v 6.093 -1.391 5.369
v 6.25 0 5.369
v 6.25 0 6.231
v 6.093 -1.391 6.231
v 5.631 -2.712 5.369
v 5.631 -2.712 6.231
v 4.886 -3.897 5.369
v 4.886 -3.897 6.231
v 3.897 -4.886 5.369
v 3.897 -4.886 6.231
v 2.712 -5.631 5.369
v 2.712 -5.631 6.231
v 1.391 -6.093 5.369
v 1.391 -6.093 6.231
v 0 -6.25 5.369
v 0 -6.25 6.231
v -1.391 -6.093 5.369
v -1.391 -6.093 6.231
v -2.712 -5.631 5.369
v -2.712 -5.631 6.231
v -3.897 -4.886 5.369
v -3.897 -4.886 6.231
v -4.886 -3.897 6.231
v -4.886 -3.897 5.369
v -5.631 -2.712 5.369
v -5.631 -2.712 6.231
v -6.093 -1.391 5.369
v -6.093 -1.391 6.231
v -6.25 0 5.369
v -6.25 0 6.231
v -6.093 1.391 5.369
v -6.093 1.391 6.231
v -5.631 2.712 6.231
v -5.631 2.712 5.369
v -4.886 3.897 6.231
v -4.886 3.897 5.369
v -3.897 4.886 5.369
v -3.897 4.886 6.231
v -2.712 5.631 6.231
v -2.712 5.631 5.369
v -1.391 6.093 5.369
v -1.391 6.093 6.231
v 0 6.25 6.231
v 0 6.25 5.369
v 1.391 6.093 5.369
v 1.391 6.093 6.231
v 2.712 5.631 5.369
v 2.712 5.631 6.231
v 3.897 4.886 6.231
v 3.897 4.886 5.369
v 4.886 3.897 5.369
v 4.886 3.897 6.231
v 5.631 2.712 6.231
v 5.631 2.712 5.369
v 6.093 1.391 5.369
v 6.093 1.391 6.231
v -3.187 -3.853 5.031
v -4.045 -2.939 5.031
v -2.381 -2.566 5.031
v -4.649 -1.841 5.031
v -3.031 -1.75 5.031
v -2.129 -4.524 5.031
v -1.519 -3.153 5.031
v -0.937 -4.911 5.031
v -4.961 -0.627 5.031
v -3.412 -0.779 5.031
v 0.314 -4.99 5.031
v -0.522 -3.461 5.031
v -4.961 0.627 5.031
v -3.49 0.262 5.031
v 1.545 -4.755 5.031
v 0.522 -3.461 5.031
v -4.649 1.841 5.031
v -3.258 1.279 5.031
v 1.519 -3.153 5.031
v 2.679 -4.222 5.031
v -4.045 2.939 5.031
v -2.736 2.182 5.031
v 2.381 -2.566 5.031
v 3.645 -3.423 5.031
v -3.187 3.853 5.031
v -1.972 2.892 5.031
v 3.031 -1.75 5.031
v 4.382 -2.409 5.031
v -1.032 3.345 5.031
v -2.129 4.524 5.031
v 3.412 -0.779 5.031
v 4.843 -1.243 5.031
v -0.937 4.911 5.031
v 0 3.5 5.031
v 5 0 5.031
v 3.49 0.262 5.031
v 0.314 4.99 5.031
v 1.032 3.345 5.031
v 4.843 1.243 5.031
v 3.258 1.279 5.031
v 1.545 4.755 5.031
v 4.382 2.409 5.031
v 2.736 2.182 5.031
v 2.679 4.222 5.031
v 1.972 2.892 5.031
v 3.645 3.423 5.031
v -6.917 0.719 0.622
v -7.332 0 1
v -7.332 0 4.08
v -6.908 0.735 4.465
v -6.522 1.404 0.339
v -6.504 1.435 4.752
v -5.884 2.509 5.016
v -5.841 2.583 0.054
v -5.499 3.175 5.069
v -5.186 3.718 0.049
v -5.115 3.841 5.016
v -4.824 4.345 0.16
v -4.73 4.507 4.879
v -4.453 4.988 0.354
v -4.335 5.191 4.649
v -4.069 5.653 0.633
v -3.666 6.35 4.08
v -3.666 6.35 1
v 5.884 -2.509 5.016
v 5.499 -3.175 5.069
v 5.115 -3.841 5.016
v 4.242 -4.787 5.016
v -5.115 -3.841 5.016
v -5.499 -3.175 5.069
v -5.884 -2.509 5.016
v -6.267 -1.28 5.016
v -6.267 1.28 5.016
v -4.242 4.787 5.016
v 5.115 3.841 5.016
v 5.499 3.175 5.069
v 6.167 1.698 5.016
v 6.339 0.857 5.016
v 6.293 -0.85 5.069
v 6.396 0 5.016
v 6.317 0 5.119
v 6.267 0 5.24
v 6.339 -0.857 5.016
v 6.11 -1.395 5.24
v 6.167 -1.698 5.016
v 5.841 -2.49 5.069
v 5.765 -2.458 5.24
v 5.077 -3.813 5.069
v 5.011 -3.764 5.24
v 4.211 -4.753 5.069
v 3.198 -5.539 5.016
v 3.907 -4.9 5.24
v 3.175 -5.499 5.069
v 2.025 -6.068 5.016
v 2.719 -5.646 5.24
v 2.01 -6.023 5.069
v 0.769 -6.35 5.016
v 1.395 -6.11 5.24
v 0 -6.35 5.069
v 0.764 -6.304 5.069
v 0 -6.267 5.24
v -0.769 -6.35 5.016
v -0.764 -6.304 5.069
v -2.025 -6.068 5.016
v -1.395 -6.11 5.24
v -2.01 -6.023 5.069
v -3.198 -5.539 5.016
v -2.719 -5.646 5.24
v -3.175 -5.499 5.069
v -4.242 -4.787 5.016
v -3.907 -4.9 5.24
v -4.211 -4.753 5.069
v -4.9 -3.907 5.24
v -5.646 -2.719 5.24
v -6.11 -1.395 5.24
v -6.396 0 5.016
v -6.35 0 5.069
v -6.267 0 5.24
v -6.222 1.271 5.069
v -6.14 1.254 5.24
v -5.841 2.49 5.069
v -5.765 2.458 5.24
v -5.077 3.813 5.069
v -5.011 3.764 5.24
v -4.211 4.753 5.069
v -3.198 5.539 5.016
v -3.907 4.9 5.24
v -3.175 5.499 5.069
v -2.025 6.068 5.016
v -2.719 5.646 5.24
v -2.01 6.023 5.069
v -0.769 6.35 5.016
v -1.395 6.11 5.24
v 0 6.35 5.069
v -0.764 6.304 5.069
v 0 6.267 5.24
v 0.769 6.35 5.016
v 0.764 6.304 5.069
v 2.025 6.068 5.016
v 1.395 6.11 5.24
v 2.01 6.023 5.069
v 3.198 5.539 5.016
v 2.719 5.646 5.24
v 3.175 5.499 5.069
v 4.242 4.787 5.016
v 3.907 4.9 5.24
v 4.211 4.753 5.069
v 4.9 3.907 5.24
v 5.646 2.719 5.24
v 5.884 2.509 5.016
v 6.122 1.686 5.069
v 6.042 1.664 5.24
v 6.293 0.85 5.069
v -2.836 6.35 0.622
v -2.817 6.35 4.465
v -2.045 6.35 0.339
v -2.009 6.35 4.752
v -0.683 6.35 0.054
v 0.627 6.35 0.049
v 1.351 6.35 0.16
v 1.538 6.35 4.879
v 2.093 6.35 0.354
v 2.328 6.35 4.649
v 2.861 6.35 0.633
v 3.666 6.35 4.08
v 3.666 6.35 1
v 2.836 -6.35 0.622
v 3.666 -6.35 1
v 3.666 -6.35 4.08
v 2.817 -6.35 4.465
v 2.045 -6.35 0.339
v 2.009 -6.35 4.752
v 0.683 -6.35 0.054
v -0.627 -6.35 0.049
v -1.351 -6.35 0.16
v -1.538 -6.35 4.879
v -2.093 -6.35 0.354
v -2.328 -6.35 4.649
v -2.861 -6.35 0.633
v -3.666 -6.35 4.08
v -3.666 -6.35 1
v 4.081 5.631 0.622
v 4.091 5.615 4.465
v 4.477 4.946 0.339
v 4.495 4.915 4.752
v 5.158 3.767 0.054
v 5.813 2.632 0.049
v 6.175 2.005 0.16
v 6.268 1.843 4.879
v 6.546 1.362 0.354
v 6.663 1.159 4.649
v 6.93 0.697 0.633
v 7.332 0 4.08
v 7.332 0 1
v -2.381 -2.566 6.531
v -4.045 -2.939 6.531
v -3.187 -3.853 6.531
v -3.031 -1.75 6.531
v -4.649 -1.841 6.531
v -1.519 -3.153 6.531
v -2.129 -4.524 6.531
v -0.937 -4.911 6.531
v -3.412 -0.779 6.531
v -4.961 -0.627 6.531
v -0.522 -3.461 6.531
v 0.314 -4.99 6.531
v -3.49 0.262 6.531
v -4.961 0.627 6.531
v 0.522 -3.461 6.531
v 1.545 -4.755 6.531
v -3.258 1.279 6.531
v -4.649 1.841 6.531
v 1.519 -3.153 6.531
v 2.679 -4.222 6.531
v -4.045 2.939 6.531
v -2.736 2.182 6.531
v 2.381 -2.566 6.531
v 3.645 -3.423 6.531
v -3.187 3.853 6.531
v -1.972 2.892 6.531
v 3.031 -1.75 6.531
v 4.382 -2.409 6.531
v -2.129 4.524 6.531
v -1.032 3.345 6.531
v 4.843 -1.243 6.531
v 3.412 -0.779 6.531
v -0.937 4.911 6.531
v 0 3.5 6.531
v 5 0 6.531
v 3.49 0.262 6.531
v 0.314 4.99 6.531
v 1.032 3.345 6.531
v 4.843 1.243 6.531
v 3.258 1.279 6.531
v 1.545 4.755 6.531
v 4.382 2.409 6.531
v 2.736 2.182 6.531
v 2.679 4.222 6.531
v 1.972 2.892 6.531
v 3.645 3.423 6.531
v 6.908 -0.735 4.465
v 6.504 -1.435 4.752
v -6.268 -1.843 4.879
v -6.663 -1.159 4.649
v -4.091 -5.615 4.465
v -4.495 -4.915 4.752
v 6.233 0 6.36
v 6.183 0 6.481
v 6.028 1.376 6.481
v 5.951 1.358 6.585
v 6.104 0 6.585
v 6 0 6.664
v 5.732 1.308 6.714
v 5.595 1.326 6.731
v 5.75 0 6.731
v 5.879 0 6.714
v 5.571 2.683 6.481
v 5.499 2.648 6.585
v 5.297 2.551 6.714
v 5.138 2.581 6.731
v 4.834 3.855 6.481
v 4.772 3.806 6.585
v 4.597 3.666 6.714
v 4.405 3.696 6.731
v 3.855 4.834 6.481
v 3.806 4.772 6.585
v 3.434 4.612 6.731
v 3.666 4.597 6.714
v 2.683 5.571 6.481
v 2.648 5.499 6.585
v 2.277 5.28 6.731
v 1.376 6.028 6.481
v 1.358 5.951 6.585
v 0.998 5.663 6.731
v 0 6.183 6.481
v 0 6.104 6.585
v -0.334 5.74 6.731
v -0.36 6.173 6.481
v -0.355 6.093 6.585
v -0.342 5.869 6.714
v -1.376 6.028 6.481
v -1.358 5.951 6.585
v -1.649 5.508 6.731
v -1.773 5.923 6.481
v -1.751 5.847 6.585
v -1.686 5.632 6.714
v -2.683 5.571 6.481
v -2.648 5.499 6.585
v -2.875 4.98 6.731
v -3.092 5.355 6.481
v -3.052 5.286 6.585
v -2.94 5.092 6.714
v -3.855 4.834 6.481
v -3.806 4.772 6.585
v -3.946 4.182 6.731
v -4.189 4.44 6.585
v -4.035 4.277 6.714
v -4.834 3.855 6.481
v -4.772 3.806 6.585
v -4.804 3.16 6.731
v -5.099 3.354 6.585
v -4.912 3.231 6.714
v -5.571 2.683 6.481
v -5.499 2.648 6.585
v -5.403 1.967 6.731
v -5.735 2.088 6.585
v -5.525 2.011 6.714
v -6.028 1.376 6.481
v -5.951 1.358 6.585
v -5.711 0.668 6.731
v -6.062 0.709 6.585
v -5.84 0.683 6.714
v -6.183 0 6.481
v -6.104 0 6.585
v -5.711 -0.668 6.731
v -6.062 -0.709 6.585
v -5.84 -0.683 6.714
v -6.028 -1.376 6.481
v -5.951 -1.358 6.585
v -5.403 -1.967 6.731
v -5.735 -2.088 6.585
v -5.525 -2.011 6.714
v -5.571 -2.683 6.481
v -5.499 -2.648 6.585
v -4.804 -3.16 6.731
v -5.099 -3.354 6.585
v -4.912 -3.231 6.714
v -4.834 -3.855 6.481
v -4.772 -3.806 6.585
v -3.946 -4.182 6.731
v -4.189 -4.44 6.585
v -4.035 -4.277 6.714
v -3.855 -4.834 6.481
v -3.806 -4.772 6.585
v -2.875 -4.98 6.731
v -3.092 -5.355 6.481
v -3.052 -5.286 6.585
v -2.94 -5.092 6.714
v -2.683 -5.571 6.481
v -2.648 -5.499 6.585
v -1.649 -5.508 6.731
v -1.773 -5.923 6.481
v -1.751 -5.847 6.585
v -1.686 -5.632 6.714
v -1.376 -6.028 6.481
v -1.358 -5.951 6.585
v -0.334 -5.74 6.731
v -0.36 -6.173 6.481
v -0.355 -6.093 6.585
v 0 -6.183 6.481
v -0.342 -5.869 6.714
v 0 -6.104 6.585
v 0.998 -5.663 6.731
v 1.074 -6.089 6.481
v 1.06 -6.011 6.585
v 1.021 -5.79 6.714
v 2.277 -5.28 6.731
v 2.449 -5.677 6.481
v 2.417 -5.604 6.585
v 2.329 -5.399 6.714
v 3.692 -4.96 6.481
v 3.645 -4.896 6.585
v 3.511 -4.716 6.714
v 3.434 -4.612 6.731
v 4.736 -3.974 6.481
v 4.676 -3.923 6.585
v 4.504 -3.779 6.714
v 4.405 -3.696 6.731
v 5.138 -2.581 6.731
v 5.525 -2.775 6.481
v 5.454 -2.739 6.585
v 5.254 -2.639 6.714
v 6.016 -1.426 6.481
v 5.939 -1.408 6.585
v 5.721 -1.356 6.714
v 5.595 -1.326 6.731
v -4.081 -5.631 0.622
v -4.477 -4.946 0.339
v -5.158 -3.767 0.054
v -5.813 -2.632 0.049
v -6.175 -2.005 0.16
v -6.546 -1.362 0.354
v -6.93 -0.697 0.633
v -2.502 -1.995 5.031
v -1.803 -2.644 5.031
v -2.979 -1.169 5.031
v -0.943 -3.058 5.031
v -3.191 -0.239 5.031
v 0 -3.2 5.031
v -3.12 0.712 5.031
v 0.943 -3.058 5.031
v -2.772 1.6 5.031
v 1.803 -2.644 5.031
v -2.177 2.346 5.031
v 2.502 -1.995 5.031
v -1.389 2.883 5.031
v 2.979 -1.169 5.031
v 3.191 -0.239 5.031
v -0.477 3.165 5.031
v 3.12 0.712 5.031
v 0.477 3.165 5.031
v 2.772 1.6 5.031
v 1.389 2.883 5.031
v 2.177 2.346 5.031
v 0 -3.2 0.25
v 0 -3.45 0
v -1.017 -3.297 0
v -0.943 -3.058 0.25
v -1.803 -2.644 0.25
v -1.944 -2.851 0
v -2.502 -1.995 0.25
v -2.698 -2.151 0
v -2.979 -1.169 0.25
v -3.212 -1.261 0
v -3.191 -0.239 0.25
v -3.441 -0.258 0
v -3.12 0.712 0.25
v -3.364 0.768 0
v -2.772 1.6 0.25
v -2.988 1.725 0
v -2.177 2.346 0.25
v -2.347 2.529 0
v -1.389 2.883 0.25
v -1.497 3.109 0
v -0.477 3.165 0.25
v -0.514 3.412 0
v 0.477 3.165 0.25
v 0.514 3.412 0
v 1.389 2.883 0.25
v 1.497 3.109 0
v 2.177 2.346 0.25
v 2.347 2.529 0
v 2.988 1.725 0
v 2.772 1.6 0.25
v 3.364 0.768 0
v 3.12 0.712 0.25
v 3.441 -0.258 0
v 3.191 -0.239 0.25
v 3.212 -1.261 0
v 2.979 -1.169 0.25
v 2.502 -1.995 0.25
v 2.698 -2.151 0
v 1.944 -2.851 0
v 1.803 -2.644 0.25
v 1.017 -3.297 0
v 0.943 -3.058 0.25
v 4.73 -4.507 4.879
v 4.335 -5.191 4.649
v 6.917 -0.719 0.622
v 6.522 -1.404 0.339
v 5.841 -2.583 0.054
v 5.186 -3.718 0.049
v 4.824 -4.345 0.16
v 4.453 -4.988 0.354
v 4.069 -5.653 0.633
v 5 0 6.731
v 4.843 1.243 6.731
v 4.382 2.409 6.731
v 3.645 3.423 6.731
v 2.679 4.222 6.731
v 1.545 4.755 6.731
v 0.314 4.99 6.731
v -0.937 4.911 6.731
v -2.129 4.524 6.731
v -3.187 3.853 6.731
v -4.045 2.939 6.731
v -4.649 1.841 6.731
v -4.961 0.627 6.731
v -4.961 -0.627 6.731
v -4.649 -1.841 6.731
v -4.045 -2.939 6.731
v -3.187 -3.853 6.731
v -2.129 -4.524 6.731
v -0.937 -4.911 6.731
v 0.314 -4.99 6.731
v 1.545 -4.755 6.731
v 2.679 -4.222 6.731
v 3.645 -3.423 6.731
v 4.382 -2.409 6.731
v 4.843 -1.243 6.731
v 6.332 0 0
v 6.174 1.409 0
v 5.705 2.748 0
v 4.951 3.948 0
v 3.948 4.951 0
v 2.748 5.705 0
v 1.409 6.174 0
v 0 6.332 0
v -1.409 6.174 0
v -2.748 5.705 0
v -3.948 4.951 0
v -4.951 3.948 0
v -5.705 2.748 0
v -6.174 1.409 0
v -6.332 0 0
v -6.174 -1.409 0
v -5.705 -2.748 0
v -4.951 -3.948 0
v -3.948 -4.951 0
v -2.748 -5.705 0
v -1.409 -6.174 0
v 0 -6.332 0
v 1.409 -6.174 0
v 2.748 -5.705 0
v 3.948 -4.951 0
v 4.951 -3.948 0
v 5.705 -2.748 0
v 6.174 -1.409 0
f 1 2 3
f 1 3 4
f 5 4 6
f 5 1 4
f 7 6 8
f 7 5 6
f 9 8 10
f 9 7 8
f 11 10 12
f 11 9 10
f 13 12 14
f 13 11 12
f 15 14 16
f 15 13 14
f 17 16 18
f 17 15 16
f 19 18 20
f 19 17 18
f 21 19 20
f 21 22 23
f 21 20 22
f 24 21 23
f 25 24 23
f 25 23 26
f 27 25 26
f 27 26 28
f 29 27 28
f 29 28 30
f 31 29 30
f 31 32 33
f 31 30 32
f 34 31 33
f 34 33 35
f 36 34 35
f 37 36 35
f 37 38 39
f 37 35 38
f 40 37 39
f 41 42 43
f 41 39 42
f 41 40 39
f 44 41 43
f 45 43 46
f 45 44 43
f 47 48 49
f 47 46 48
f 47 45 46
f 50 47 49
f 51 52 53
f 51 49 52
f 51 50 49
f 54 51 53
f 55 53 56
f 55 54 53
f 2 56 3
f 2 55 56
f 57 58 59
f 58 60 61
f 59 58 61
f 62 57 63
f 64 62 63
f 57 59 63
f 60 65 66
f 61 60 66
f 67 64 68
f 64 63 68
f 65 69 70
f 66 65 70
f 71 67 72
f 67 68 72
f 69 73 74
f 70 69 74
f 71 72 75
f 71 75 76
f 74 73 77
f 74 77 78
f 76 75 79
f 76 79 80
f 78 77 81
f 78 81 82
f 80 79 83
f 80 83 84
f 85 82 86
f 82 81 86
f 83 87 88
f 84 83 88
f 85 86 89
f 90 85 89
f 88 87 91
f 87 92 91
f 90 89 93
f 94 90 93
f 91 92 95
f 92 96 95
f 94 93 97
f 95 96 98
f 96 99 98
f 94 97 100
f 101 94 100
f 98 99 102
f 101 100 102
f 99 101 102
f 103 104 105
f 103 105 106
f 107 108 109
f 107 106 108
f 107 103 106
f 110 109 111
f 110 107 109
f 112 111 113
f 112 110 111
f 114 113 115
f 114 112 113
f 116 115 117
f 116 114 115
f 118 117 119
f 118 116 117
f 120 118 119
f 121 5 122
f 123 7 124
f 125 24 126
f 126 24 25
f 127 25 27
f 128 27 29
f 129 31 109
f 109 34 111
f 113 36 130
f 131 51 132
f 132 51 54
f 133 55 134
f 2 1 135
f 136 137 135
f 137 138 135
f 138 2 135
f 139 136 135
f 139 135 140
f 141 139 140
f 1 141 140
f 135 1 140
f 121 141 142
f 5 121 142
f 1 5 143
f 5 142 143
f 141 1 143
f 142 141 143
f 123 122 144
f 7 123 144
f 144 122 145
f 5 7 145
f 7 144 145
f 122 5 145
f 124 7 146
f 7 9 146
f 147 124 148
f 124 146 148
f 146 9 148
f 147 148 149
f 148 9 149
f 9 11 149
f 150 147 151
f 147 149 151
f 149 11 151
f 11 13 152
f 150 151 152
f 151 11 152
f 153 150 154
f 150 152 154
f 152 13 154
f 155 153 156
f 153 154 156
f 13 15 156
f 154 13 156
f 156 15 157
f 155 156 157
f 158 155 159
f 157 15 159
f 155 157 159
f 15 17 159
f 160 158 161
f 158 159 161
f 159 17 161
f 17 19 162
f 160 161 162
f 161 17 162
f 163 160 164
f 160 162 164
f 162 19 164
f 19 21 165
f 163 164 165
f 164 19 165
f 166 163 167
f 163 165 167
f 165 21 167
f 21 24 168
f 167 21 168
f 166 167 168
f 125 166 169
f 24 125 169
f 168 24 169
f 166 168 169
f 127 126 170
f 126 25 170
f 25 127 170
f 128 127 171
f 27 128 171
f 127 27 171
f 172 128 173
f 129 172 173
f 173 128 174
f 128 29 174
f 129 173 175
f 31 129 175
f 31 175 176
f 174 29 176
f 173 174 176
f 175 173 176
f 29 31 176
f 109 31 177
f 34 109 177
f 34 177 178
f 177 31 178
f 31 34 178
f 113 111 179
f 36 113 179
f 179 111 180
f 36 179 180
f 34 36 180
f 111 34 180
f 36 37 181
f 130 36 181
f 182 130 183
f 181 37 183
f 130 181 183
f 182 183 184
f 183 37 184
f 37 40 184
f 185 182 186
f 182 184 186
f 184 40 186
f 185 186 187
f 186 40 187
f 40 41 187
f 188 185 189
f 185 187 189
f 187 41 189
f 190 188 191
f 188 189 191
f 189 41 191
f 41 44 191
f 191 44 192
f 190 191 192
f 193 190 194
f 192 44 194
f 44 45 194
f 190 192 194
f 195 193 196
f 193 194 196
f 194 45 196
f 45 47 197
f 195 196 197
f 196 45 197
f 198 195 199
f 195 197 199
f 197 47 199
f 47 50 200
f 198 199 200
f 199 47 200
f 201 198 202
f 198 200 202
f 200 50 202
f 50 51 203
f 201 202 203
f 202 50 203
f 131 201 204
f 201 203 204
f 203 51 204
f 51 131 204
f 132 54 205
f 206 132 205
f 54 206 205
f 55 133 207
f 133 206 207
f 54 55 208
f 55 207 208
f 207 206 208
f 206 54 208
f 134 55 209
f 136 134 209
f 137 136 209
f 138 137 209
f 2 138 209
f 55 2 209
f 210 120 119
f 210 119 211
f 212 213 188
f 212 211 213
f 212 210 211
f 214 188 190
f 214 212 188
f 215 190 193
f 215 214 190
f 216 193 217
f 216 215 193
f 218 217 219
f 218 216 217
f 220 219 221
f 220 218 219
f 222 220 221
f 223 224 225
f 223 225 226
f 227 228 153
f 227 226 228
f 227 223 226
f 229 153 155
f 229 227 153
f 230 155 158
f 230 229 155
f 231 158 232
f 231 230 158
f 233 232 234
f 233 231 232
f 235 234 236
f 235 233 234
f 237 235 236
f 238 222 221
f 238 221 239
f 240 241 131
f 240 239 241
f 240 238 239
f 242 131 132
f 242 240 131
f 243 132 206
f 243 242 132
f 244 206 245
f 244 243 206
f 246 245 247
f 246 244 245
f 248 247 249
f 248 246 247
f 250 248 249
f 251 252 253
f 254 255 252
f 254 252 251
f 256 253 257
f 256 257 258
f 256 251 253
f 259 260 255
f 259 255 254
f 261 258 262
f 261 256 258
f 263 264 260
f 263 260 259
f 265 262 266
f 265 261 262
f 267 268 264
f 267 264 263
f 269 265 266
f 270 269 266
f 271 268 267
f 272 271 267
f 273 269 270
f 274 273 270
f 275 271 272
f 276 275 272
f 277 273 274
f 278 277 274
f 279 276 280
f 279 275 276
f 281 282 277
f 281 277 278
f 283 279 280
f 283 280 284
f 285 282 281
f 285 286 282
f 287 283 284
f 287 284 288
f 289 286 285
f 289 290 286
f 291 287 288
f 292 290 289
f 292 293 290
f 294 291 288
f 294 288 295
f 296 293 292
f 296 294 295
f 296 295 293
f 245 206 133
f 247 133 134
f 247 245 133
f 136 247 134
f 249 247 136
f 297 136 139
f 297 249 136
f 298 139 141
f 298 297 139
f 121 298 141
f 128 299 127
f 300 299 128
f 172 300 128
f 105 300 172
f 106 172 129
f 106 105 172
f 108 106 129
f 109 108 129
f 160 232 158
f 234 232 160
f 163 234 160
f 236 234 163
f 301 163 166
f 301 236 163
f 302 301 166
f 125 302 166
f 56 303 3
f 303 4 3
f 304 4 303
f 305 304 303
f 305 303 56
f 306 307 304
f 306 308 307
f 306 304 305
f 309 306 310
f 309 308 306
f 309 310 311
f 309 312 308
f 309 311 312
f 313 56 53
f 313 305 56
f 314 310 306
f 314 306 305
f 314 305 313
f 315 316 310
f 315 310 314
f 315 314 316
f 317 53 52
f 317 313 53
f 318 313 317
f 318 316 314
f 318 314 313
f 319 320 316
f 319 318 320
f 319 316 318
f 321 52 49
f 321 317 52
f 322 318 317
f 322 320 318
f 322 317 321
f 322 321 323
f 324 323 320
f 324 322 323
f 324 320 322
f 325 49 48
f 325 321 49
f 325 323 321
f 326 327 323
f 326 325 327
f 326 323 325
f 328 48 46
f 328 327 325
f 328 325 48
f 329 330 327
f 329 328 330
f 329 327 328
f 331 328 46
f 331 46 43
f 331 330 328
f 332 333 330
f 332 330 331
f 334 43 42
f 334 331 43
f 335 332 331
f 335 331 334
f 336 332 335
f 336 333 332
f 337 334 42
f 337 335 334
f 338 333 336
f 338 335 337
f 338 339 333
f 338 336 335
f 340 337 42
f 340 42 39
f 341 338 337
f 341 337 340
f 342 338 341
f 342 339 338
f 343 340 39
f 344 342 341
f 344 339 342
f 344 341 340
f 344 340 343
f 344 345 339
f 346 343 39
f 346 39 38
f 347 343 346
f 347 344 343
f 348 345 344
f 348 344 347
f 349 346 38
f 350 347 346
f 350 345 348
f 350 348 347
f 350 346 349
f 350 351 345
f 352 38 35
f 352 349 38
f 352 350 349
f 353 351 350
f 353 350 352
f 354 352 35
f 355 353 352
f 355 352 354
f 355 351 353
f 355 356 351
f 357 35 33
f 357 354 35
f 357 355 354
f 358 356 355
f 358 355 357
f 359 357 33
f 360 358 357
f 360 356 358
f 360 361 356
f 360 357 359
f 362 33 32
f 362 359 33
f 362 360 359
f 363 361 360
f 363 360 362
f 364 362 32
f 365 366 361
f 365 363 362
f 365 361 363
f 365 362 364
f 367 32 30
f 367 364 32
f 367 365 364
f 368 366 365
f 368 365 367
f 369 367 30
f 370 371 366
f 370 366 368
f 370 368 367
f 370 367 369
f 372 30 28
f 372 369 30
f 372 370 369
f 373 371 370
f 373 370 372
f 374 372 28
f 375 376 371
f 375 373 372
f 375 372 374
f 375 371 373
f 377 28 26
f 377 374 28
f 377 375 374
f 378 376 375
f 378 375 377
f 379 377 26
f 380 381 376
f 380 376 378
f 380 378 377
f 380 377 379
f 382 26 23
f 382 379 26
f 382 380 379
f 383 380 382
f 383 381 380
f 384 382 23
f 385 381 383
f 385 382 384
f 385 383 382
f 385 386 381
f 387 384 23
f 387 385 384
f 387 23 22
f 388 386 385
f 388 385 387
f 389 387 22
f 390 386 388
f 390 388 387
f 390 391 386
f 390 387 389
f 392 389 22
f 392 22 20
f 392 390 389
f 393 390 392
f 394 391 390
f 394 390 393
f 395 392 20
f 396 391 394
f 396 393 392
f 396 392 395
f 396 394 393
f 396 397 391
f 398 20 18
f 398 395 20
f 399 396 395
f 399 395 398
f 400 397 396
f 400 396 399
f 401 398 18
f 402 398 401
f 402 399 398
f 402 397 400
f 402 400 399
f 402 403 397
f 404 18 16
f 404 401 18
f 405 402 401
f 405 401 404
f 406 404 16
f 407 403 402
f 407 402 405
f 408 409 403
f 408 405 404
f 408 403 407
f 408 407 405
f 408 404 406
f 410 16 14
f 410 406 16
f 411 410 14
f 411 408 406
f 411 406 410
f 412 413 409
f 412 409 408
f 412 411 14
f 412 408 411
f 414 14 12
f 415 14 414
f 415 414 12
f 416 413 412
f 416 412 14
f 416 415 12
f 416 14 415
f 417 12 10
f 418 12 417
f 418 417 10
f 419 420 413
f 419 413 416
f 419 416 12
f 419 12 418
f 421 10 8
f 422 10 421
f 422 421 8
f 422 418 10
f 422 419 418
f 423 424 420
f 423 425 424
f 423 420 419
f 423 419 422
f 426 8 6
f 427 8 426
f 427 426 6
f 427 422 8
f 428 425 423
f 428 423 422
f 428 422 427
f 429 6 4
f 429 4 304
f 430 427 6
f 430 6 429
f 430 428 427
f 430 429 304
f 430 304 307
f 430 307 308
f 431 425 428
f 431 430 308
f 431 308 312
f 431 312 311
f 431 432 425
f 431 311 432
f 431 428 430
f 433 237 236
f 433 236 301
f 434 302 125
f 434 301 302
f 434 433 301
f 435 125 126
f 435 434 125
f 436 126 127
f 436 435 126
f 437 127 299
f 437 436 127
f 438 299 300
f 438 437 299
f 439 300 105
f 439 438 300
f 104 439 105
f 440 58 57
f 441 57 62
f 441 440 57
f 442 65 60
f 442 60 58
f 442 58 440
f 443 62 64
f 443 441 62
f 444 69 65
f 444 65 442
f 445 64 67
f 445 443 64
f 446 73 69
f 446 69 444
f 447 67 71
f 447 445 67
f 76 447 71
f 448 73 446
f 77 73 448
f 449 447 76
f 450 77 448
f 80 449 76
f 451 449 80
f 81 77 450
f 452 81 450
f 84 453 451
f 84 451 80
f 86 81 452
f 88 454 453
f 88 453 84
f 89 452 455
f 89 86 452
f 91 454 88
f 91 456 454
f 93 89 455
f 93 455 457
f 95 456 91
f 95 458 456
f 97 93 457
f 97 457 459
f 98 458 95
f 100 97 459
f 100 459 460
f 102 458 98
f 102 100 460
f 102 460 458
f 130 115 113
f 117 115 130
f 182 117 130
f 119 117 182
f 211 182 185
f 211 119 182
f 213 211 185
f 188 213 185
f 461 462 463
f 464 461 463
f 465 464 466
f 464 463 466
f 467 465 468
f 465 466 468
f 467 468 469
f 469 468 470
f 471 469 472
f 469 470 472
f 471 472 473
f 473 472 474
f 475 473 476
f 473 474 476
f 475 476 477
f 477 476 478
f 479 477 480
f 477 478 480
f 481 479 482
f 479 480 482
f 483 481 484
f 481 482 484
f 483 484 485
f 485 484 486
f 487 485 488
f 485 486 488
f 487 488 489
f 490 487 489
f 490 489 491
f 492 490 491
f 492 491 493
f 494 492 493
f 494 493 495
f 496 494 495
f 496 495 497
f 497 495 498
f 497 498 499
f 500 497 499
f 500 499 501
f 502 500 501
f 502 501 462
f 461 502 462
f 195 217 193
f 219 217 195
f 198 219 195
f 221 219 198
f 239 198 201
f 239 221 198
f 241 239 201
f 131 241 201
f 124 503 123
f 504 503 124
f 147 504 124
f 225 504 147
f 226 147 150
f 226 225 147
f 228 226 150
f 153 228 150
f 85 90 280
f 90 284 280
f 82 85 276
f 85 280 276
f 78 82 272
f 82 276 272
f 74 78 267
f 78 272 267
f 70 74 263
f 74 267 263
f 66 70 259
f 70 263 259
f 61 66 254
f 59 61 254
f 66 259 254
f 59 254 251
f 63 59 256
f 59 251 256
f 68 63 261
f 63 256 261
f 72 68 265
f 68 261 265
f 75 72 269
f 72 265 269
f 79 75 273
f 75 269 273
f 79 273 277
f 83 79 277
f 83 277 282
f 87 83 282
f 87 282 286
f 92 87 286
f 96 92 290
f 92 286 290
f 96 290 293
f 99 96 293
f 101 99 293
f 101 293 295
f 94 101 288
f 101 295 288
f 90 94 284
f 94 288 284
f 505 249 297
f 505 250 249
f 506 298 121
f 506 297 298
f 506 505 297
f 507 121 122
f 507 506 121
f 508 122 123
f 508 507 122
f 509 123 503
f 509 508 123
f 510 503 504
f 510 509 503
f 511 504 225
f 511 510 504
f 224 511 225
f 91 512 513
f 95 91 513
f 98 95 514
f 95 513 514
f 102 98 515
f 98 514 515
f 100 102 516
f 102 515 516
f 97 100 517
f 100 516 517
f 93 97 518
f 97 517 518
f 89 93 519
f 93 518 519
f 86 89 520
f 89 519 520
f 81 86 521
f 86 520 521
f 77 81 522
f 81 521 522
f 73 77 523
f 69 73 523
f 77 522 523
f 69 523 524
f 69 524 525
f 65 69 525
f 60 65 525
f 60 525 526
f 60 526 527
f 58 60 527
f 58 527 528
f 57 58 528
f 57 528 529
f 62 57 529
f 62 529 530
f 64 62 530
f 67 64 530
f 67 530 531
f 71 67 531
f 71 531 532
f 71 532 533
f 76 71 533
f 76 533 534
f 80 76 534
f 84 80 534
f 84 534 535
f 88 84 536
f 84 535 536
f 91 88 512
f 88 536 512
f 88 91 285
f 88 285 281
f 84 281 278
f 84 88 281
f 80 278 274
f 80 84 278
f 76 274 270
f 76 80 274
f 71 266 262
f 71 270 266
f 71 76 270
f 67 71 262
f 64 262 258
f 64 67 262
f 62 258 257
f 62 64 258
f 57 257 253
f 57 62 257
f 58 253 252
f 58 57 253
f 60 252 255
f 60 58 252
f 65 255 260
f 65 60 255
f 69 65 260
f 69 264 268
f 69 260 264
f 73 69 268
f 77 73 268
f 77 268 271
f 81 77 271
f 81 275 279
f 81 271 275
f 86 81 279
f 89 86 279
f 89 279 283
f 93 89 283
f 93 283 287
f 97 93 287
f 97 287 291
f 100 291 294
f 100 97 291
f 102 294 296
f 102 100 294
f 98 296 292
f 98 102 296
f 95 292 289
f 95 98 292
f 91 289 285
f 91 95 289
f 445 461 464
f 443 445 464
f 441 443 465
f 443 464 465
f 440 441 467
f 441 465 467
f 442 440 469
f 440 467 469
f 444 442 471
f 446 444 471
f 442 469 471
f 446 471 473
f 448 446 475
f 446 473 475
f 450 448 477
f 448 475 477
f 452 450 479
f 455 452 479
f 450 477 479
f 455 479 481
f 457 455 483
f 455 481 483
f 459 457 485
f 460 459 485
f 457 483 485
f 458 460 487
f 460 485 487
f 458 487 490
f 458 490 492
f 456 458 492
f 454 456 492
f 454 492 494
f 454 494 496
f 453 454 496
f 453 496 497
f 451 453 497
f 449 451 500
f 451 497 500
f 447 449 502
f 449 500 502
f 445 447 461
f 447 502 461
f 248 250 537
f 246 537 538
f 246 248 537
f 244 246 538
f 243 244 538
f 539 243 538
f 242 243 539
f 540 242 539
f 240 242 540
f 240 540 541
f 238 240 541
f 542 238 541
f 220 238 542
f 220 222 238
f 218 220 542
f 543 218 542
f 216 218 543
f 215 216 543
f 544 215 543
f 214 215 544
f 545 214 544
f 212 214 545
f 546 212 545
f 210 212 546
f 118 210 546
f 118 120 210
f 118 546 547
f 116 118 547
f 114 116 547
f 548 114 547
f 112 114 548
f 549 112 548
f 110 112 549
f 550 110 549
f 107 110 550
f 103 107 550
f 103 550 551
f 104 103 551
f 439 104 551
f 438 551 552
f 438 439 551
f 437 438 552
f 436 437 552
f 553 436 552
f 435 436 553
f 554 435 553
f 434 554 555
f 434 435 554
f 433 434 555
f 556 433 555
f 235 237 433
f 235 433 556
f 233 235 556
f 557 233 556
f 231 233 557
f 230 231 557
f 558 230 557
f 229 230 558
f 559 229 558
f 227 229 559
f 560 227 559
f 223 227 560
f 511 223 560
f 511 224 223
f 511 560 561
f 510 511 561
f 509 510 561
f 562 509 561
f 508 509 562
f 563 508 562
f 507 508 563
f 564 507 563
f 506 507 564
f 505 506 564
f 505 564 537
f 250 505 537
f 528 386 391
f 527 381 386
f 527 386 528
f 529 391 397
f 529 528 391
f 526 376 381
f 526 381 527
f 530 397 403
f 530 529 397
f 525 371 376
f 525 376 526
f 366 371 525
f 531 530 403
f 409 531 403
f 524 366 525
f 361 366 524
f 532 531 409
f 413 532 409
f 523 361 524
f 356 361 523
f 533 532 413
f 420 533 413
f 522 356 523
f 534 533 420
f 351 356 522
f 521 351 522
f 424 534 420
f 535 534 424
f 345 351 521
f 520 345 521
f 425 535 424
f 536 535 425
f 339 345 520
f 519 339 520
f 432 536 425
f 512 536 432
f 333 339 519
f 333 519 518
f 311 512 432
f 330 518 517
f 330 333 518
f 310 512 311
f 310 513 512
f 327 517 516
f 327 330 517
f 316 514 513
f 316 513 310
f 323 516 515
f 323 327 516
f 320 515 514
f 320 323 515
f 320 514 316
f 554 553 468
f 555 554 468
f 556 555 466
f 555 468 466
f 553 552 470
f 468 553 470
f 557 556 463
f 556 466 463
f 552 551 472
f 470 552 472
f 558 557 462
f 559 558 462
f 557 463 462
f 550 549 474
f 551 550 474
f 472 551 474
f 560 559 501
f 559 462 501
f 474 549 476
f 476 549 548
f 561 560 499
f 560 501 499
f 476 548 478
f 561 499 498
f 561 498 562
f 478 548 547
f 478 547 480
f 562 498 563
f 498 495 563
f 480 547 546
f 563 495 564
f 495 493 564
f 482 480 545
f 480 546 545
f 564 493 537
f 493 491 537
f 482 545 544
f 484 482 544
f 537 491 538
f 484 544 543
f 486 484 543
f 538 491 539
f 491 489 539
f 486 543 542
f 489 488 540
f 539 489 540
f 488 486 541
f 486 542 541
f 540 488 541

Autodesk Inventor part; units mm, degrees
ref_plane "YZ Plane" through (0, 0, 0) normal (1, 0, 0) x (0, 1, 0)
ref_plane "XZ Plane" through (0, 0, 0) normal (0, 1, 0) x (-1, 0, 0)
ref_plane "XY Plane" through (0, 0, 0) normal (0, 0, 1) x (1, 0, 0)
sketch "Sketch1" plane through (0, 0, 0) normal (0, 0, 1) x (1, 0, 0)
  circle A0 centre (0, 0) radius 7.332348
  line L0 (-3.666174, 6.35) -> (3.666174, 6.35)
  line L1 (3.666174, 6.35) -> (7.332348, 0)
  line L2 (7.332348, 0) -> (3.666174, -6.35)
  line L3 (3.666174, -6.35) -> (-3.666174, -6.35)
  line L4 (-3.666174, -6.35) -> (-7.332348, 0)
  line L5 (-7.332348, 0) -> (-3.666174, 6.35)
  point P0 (-7.332348, 0)
  point P1 (-7.332348, 0)
  point P2 (-3.666174, 6.35)
  point P3 (-3.666174, 6.35)
  point P4 (-3.666174, -6.35)
  point P5 (-3.666174, -6.35)
  point P6 (3.666174, -6.35)
  point P7 (3.666174, -6.35)
  point P8 (7.332348, 0)
  point P9 (7.332348, 0)
  dimension "d0" = 12.7
extrude "Extrusion1" add sketch "Sketch1" along normal blind 5.08
chamfer "Chamfer1" distance 1 angle 45 2 edges at (-7.3323, 0, 0) (-7.3323, 0, 5.08)
extrude "Extrusion2" cut sketch "Sketch1" along normal through all contours L1 A0 | A0 L2 | L0 A0 | A0 L3 | L5 A0 | A0 L4
sketch "Sketch2" plane through (0, 0, 5.08) normal (0, 0, 1) x (1, 0, 0)
  circle A0 centre (0, 0) radius 6.332348
  circle A1 centre (0, 0) radius 6.25
  point P0 (2.236519, -6.35)
  point P1 (6.617521, 1.238118)
  dimension "d9" = 12.5
extrude "Extrusion3" add sketch "Sketch2" along normal blind 1.651 contours A1
fillet "Fillet1" radius 0.5 3 edges at (-6.25, 0, 5.08) (-6.3323, 0, 5.08) (-6.25, 0, 6.731)
sketch "Sketch3" plane through (0, 0, 6.731) normal (0, 0, 1) x (1, 0, 0)
  circle A0 centre (0, 0) radius 5
  dimension "d13" = 10
extrude "Extrusion4" cut sketch "Sketch3" against normal blind 1.7
sketch "Sketch4" plane through (0, 0, 5.031) normal (0, 0, 1) x (1, 0, 0)
  circle A0 centre (0, 0) radius 5 projected
extrude "Extrusion5" add sketch "Sketch4" along normal blind 1.5 separate body
sketch "Sketch5" plane through (0, 0, 6.531) normal (0, 0, 1) x (1, 0, 0)
  circle A0 centre (0, 0) radius 5 projected
hole "Hole1" at (0, 0, 6.531) direction (0, 0, -1) diameter 6.4008 end through all bodies 1 thread size "5/16-18 UNC" class "2B" standard "ANSI Unified Screw Threads"
sketch "Sketch6" plane through (0, 0, 5.031) normal (0, 0, -1) x (-1, 0, 0)
  circle A0 centre (0, 0) radius 3.2004 projected
hole "Hole2" at (0, 0, 5.031) direction (0, 0, 1) diameter 7 end through all bodies 2
chamfer "Chamfer2" distance 0.25 angle 45 1 edges at (0, 3.2004, 0)
properties part number "Gas Strut Locknut" material "Stainless Steel"
